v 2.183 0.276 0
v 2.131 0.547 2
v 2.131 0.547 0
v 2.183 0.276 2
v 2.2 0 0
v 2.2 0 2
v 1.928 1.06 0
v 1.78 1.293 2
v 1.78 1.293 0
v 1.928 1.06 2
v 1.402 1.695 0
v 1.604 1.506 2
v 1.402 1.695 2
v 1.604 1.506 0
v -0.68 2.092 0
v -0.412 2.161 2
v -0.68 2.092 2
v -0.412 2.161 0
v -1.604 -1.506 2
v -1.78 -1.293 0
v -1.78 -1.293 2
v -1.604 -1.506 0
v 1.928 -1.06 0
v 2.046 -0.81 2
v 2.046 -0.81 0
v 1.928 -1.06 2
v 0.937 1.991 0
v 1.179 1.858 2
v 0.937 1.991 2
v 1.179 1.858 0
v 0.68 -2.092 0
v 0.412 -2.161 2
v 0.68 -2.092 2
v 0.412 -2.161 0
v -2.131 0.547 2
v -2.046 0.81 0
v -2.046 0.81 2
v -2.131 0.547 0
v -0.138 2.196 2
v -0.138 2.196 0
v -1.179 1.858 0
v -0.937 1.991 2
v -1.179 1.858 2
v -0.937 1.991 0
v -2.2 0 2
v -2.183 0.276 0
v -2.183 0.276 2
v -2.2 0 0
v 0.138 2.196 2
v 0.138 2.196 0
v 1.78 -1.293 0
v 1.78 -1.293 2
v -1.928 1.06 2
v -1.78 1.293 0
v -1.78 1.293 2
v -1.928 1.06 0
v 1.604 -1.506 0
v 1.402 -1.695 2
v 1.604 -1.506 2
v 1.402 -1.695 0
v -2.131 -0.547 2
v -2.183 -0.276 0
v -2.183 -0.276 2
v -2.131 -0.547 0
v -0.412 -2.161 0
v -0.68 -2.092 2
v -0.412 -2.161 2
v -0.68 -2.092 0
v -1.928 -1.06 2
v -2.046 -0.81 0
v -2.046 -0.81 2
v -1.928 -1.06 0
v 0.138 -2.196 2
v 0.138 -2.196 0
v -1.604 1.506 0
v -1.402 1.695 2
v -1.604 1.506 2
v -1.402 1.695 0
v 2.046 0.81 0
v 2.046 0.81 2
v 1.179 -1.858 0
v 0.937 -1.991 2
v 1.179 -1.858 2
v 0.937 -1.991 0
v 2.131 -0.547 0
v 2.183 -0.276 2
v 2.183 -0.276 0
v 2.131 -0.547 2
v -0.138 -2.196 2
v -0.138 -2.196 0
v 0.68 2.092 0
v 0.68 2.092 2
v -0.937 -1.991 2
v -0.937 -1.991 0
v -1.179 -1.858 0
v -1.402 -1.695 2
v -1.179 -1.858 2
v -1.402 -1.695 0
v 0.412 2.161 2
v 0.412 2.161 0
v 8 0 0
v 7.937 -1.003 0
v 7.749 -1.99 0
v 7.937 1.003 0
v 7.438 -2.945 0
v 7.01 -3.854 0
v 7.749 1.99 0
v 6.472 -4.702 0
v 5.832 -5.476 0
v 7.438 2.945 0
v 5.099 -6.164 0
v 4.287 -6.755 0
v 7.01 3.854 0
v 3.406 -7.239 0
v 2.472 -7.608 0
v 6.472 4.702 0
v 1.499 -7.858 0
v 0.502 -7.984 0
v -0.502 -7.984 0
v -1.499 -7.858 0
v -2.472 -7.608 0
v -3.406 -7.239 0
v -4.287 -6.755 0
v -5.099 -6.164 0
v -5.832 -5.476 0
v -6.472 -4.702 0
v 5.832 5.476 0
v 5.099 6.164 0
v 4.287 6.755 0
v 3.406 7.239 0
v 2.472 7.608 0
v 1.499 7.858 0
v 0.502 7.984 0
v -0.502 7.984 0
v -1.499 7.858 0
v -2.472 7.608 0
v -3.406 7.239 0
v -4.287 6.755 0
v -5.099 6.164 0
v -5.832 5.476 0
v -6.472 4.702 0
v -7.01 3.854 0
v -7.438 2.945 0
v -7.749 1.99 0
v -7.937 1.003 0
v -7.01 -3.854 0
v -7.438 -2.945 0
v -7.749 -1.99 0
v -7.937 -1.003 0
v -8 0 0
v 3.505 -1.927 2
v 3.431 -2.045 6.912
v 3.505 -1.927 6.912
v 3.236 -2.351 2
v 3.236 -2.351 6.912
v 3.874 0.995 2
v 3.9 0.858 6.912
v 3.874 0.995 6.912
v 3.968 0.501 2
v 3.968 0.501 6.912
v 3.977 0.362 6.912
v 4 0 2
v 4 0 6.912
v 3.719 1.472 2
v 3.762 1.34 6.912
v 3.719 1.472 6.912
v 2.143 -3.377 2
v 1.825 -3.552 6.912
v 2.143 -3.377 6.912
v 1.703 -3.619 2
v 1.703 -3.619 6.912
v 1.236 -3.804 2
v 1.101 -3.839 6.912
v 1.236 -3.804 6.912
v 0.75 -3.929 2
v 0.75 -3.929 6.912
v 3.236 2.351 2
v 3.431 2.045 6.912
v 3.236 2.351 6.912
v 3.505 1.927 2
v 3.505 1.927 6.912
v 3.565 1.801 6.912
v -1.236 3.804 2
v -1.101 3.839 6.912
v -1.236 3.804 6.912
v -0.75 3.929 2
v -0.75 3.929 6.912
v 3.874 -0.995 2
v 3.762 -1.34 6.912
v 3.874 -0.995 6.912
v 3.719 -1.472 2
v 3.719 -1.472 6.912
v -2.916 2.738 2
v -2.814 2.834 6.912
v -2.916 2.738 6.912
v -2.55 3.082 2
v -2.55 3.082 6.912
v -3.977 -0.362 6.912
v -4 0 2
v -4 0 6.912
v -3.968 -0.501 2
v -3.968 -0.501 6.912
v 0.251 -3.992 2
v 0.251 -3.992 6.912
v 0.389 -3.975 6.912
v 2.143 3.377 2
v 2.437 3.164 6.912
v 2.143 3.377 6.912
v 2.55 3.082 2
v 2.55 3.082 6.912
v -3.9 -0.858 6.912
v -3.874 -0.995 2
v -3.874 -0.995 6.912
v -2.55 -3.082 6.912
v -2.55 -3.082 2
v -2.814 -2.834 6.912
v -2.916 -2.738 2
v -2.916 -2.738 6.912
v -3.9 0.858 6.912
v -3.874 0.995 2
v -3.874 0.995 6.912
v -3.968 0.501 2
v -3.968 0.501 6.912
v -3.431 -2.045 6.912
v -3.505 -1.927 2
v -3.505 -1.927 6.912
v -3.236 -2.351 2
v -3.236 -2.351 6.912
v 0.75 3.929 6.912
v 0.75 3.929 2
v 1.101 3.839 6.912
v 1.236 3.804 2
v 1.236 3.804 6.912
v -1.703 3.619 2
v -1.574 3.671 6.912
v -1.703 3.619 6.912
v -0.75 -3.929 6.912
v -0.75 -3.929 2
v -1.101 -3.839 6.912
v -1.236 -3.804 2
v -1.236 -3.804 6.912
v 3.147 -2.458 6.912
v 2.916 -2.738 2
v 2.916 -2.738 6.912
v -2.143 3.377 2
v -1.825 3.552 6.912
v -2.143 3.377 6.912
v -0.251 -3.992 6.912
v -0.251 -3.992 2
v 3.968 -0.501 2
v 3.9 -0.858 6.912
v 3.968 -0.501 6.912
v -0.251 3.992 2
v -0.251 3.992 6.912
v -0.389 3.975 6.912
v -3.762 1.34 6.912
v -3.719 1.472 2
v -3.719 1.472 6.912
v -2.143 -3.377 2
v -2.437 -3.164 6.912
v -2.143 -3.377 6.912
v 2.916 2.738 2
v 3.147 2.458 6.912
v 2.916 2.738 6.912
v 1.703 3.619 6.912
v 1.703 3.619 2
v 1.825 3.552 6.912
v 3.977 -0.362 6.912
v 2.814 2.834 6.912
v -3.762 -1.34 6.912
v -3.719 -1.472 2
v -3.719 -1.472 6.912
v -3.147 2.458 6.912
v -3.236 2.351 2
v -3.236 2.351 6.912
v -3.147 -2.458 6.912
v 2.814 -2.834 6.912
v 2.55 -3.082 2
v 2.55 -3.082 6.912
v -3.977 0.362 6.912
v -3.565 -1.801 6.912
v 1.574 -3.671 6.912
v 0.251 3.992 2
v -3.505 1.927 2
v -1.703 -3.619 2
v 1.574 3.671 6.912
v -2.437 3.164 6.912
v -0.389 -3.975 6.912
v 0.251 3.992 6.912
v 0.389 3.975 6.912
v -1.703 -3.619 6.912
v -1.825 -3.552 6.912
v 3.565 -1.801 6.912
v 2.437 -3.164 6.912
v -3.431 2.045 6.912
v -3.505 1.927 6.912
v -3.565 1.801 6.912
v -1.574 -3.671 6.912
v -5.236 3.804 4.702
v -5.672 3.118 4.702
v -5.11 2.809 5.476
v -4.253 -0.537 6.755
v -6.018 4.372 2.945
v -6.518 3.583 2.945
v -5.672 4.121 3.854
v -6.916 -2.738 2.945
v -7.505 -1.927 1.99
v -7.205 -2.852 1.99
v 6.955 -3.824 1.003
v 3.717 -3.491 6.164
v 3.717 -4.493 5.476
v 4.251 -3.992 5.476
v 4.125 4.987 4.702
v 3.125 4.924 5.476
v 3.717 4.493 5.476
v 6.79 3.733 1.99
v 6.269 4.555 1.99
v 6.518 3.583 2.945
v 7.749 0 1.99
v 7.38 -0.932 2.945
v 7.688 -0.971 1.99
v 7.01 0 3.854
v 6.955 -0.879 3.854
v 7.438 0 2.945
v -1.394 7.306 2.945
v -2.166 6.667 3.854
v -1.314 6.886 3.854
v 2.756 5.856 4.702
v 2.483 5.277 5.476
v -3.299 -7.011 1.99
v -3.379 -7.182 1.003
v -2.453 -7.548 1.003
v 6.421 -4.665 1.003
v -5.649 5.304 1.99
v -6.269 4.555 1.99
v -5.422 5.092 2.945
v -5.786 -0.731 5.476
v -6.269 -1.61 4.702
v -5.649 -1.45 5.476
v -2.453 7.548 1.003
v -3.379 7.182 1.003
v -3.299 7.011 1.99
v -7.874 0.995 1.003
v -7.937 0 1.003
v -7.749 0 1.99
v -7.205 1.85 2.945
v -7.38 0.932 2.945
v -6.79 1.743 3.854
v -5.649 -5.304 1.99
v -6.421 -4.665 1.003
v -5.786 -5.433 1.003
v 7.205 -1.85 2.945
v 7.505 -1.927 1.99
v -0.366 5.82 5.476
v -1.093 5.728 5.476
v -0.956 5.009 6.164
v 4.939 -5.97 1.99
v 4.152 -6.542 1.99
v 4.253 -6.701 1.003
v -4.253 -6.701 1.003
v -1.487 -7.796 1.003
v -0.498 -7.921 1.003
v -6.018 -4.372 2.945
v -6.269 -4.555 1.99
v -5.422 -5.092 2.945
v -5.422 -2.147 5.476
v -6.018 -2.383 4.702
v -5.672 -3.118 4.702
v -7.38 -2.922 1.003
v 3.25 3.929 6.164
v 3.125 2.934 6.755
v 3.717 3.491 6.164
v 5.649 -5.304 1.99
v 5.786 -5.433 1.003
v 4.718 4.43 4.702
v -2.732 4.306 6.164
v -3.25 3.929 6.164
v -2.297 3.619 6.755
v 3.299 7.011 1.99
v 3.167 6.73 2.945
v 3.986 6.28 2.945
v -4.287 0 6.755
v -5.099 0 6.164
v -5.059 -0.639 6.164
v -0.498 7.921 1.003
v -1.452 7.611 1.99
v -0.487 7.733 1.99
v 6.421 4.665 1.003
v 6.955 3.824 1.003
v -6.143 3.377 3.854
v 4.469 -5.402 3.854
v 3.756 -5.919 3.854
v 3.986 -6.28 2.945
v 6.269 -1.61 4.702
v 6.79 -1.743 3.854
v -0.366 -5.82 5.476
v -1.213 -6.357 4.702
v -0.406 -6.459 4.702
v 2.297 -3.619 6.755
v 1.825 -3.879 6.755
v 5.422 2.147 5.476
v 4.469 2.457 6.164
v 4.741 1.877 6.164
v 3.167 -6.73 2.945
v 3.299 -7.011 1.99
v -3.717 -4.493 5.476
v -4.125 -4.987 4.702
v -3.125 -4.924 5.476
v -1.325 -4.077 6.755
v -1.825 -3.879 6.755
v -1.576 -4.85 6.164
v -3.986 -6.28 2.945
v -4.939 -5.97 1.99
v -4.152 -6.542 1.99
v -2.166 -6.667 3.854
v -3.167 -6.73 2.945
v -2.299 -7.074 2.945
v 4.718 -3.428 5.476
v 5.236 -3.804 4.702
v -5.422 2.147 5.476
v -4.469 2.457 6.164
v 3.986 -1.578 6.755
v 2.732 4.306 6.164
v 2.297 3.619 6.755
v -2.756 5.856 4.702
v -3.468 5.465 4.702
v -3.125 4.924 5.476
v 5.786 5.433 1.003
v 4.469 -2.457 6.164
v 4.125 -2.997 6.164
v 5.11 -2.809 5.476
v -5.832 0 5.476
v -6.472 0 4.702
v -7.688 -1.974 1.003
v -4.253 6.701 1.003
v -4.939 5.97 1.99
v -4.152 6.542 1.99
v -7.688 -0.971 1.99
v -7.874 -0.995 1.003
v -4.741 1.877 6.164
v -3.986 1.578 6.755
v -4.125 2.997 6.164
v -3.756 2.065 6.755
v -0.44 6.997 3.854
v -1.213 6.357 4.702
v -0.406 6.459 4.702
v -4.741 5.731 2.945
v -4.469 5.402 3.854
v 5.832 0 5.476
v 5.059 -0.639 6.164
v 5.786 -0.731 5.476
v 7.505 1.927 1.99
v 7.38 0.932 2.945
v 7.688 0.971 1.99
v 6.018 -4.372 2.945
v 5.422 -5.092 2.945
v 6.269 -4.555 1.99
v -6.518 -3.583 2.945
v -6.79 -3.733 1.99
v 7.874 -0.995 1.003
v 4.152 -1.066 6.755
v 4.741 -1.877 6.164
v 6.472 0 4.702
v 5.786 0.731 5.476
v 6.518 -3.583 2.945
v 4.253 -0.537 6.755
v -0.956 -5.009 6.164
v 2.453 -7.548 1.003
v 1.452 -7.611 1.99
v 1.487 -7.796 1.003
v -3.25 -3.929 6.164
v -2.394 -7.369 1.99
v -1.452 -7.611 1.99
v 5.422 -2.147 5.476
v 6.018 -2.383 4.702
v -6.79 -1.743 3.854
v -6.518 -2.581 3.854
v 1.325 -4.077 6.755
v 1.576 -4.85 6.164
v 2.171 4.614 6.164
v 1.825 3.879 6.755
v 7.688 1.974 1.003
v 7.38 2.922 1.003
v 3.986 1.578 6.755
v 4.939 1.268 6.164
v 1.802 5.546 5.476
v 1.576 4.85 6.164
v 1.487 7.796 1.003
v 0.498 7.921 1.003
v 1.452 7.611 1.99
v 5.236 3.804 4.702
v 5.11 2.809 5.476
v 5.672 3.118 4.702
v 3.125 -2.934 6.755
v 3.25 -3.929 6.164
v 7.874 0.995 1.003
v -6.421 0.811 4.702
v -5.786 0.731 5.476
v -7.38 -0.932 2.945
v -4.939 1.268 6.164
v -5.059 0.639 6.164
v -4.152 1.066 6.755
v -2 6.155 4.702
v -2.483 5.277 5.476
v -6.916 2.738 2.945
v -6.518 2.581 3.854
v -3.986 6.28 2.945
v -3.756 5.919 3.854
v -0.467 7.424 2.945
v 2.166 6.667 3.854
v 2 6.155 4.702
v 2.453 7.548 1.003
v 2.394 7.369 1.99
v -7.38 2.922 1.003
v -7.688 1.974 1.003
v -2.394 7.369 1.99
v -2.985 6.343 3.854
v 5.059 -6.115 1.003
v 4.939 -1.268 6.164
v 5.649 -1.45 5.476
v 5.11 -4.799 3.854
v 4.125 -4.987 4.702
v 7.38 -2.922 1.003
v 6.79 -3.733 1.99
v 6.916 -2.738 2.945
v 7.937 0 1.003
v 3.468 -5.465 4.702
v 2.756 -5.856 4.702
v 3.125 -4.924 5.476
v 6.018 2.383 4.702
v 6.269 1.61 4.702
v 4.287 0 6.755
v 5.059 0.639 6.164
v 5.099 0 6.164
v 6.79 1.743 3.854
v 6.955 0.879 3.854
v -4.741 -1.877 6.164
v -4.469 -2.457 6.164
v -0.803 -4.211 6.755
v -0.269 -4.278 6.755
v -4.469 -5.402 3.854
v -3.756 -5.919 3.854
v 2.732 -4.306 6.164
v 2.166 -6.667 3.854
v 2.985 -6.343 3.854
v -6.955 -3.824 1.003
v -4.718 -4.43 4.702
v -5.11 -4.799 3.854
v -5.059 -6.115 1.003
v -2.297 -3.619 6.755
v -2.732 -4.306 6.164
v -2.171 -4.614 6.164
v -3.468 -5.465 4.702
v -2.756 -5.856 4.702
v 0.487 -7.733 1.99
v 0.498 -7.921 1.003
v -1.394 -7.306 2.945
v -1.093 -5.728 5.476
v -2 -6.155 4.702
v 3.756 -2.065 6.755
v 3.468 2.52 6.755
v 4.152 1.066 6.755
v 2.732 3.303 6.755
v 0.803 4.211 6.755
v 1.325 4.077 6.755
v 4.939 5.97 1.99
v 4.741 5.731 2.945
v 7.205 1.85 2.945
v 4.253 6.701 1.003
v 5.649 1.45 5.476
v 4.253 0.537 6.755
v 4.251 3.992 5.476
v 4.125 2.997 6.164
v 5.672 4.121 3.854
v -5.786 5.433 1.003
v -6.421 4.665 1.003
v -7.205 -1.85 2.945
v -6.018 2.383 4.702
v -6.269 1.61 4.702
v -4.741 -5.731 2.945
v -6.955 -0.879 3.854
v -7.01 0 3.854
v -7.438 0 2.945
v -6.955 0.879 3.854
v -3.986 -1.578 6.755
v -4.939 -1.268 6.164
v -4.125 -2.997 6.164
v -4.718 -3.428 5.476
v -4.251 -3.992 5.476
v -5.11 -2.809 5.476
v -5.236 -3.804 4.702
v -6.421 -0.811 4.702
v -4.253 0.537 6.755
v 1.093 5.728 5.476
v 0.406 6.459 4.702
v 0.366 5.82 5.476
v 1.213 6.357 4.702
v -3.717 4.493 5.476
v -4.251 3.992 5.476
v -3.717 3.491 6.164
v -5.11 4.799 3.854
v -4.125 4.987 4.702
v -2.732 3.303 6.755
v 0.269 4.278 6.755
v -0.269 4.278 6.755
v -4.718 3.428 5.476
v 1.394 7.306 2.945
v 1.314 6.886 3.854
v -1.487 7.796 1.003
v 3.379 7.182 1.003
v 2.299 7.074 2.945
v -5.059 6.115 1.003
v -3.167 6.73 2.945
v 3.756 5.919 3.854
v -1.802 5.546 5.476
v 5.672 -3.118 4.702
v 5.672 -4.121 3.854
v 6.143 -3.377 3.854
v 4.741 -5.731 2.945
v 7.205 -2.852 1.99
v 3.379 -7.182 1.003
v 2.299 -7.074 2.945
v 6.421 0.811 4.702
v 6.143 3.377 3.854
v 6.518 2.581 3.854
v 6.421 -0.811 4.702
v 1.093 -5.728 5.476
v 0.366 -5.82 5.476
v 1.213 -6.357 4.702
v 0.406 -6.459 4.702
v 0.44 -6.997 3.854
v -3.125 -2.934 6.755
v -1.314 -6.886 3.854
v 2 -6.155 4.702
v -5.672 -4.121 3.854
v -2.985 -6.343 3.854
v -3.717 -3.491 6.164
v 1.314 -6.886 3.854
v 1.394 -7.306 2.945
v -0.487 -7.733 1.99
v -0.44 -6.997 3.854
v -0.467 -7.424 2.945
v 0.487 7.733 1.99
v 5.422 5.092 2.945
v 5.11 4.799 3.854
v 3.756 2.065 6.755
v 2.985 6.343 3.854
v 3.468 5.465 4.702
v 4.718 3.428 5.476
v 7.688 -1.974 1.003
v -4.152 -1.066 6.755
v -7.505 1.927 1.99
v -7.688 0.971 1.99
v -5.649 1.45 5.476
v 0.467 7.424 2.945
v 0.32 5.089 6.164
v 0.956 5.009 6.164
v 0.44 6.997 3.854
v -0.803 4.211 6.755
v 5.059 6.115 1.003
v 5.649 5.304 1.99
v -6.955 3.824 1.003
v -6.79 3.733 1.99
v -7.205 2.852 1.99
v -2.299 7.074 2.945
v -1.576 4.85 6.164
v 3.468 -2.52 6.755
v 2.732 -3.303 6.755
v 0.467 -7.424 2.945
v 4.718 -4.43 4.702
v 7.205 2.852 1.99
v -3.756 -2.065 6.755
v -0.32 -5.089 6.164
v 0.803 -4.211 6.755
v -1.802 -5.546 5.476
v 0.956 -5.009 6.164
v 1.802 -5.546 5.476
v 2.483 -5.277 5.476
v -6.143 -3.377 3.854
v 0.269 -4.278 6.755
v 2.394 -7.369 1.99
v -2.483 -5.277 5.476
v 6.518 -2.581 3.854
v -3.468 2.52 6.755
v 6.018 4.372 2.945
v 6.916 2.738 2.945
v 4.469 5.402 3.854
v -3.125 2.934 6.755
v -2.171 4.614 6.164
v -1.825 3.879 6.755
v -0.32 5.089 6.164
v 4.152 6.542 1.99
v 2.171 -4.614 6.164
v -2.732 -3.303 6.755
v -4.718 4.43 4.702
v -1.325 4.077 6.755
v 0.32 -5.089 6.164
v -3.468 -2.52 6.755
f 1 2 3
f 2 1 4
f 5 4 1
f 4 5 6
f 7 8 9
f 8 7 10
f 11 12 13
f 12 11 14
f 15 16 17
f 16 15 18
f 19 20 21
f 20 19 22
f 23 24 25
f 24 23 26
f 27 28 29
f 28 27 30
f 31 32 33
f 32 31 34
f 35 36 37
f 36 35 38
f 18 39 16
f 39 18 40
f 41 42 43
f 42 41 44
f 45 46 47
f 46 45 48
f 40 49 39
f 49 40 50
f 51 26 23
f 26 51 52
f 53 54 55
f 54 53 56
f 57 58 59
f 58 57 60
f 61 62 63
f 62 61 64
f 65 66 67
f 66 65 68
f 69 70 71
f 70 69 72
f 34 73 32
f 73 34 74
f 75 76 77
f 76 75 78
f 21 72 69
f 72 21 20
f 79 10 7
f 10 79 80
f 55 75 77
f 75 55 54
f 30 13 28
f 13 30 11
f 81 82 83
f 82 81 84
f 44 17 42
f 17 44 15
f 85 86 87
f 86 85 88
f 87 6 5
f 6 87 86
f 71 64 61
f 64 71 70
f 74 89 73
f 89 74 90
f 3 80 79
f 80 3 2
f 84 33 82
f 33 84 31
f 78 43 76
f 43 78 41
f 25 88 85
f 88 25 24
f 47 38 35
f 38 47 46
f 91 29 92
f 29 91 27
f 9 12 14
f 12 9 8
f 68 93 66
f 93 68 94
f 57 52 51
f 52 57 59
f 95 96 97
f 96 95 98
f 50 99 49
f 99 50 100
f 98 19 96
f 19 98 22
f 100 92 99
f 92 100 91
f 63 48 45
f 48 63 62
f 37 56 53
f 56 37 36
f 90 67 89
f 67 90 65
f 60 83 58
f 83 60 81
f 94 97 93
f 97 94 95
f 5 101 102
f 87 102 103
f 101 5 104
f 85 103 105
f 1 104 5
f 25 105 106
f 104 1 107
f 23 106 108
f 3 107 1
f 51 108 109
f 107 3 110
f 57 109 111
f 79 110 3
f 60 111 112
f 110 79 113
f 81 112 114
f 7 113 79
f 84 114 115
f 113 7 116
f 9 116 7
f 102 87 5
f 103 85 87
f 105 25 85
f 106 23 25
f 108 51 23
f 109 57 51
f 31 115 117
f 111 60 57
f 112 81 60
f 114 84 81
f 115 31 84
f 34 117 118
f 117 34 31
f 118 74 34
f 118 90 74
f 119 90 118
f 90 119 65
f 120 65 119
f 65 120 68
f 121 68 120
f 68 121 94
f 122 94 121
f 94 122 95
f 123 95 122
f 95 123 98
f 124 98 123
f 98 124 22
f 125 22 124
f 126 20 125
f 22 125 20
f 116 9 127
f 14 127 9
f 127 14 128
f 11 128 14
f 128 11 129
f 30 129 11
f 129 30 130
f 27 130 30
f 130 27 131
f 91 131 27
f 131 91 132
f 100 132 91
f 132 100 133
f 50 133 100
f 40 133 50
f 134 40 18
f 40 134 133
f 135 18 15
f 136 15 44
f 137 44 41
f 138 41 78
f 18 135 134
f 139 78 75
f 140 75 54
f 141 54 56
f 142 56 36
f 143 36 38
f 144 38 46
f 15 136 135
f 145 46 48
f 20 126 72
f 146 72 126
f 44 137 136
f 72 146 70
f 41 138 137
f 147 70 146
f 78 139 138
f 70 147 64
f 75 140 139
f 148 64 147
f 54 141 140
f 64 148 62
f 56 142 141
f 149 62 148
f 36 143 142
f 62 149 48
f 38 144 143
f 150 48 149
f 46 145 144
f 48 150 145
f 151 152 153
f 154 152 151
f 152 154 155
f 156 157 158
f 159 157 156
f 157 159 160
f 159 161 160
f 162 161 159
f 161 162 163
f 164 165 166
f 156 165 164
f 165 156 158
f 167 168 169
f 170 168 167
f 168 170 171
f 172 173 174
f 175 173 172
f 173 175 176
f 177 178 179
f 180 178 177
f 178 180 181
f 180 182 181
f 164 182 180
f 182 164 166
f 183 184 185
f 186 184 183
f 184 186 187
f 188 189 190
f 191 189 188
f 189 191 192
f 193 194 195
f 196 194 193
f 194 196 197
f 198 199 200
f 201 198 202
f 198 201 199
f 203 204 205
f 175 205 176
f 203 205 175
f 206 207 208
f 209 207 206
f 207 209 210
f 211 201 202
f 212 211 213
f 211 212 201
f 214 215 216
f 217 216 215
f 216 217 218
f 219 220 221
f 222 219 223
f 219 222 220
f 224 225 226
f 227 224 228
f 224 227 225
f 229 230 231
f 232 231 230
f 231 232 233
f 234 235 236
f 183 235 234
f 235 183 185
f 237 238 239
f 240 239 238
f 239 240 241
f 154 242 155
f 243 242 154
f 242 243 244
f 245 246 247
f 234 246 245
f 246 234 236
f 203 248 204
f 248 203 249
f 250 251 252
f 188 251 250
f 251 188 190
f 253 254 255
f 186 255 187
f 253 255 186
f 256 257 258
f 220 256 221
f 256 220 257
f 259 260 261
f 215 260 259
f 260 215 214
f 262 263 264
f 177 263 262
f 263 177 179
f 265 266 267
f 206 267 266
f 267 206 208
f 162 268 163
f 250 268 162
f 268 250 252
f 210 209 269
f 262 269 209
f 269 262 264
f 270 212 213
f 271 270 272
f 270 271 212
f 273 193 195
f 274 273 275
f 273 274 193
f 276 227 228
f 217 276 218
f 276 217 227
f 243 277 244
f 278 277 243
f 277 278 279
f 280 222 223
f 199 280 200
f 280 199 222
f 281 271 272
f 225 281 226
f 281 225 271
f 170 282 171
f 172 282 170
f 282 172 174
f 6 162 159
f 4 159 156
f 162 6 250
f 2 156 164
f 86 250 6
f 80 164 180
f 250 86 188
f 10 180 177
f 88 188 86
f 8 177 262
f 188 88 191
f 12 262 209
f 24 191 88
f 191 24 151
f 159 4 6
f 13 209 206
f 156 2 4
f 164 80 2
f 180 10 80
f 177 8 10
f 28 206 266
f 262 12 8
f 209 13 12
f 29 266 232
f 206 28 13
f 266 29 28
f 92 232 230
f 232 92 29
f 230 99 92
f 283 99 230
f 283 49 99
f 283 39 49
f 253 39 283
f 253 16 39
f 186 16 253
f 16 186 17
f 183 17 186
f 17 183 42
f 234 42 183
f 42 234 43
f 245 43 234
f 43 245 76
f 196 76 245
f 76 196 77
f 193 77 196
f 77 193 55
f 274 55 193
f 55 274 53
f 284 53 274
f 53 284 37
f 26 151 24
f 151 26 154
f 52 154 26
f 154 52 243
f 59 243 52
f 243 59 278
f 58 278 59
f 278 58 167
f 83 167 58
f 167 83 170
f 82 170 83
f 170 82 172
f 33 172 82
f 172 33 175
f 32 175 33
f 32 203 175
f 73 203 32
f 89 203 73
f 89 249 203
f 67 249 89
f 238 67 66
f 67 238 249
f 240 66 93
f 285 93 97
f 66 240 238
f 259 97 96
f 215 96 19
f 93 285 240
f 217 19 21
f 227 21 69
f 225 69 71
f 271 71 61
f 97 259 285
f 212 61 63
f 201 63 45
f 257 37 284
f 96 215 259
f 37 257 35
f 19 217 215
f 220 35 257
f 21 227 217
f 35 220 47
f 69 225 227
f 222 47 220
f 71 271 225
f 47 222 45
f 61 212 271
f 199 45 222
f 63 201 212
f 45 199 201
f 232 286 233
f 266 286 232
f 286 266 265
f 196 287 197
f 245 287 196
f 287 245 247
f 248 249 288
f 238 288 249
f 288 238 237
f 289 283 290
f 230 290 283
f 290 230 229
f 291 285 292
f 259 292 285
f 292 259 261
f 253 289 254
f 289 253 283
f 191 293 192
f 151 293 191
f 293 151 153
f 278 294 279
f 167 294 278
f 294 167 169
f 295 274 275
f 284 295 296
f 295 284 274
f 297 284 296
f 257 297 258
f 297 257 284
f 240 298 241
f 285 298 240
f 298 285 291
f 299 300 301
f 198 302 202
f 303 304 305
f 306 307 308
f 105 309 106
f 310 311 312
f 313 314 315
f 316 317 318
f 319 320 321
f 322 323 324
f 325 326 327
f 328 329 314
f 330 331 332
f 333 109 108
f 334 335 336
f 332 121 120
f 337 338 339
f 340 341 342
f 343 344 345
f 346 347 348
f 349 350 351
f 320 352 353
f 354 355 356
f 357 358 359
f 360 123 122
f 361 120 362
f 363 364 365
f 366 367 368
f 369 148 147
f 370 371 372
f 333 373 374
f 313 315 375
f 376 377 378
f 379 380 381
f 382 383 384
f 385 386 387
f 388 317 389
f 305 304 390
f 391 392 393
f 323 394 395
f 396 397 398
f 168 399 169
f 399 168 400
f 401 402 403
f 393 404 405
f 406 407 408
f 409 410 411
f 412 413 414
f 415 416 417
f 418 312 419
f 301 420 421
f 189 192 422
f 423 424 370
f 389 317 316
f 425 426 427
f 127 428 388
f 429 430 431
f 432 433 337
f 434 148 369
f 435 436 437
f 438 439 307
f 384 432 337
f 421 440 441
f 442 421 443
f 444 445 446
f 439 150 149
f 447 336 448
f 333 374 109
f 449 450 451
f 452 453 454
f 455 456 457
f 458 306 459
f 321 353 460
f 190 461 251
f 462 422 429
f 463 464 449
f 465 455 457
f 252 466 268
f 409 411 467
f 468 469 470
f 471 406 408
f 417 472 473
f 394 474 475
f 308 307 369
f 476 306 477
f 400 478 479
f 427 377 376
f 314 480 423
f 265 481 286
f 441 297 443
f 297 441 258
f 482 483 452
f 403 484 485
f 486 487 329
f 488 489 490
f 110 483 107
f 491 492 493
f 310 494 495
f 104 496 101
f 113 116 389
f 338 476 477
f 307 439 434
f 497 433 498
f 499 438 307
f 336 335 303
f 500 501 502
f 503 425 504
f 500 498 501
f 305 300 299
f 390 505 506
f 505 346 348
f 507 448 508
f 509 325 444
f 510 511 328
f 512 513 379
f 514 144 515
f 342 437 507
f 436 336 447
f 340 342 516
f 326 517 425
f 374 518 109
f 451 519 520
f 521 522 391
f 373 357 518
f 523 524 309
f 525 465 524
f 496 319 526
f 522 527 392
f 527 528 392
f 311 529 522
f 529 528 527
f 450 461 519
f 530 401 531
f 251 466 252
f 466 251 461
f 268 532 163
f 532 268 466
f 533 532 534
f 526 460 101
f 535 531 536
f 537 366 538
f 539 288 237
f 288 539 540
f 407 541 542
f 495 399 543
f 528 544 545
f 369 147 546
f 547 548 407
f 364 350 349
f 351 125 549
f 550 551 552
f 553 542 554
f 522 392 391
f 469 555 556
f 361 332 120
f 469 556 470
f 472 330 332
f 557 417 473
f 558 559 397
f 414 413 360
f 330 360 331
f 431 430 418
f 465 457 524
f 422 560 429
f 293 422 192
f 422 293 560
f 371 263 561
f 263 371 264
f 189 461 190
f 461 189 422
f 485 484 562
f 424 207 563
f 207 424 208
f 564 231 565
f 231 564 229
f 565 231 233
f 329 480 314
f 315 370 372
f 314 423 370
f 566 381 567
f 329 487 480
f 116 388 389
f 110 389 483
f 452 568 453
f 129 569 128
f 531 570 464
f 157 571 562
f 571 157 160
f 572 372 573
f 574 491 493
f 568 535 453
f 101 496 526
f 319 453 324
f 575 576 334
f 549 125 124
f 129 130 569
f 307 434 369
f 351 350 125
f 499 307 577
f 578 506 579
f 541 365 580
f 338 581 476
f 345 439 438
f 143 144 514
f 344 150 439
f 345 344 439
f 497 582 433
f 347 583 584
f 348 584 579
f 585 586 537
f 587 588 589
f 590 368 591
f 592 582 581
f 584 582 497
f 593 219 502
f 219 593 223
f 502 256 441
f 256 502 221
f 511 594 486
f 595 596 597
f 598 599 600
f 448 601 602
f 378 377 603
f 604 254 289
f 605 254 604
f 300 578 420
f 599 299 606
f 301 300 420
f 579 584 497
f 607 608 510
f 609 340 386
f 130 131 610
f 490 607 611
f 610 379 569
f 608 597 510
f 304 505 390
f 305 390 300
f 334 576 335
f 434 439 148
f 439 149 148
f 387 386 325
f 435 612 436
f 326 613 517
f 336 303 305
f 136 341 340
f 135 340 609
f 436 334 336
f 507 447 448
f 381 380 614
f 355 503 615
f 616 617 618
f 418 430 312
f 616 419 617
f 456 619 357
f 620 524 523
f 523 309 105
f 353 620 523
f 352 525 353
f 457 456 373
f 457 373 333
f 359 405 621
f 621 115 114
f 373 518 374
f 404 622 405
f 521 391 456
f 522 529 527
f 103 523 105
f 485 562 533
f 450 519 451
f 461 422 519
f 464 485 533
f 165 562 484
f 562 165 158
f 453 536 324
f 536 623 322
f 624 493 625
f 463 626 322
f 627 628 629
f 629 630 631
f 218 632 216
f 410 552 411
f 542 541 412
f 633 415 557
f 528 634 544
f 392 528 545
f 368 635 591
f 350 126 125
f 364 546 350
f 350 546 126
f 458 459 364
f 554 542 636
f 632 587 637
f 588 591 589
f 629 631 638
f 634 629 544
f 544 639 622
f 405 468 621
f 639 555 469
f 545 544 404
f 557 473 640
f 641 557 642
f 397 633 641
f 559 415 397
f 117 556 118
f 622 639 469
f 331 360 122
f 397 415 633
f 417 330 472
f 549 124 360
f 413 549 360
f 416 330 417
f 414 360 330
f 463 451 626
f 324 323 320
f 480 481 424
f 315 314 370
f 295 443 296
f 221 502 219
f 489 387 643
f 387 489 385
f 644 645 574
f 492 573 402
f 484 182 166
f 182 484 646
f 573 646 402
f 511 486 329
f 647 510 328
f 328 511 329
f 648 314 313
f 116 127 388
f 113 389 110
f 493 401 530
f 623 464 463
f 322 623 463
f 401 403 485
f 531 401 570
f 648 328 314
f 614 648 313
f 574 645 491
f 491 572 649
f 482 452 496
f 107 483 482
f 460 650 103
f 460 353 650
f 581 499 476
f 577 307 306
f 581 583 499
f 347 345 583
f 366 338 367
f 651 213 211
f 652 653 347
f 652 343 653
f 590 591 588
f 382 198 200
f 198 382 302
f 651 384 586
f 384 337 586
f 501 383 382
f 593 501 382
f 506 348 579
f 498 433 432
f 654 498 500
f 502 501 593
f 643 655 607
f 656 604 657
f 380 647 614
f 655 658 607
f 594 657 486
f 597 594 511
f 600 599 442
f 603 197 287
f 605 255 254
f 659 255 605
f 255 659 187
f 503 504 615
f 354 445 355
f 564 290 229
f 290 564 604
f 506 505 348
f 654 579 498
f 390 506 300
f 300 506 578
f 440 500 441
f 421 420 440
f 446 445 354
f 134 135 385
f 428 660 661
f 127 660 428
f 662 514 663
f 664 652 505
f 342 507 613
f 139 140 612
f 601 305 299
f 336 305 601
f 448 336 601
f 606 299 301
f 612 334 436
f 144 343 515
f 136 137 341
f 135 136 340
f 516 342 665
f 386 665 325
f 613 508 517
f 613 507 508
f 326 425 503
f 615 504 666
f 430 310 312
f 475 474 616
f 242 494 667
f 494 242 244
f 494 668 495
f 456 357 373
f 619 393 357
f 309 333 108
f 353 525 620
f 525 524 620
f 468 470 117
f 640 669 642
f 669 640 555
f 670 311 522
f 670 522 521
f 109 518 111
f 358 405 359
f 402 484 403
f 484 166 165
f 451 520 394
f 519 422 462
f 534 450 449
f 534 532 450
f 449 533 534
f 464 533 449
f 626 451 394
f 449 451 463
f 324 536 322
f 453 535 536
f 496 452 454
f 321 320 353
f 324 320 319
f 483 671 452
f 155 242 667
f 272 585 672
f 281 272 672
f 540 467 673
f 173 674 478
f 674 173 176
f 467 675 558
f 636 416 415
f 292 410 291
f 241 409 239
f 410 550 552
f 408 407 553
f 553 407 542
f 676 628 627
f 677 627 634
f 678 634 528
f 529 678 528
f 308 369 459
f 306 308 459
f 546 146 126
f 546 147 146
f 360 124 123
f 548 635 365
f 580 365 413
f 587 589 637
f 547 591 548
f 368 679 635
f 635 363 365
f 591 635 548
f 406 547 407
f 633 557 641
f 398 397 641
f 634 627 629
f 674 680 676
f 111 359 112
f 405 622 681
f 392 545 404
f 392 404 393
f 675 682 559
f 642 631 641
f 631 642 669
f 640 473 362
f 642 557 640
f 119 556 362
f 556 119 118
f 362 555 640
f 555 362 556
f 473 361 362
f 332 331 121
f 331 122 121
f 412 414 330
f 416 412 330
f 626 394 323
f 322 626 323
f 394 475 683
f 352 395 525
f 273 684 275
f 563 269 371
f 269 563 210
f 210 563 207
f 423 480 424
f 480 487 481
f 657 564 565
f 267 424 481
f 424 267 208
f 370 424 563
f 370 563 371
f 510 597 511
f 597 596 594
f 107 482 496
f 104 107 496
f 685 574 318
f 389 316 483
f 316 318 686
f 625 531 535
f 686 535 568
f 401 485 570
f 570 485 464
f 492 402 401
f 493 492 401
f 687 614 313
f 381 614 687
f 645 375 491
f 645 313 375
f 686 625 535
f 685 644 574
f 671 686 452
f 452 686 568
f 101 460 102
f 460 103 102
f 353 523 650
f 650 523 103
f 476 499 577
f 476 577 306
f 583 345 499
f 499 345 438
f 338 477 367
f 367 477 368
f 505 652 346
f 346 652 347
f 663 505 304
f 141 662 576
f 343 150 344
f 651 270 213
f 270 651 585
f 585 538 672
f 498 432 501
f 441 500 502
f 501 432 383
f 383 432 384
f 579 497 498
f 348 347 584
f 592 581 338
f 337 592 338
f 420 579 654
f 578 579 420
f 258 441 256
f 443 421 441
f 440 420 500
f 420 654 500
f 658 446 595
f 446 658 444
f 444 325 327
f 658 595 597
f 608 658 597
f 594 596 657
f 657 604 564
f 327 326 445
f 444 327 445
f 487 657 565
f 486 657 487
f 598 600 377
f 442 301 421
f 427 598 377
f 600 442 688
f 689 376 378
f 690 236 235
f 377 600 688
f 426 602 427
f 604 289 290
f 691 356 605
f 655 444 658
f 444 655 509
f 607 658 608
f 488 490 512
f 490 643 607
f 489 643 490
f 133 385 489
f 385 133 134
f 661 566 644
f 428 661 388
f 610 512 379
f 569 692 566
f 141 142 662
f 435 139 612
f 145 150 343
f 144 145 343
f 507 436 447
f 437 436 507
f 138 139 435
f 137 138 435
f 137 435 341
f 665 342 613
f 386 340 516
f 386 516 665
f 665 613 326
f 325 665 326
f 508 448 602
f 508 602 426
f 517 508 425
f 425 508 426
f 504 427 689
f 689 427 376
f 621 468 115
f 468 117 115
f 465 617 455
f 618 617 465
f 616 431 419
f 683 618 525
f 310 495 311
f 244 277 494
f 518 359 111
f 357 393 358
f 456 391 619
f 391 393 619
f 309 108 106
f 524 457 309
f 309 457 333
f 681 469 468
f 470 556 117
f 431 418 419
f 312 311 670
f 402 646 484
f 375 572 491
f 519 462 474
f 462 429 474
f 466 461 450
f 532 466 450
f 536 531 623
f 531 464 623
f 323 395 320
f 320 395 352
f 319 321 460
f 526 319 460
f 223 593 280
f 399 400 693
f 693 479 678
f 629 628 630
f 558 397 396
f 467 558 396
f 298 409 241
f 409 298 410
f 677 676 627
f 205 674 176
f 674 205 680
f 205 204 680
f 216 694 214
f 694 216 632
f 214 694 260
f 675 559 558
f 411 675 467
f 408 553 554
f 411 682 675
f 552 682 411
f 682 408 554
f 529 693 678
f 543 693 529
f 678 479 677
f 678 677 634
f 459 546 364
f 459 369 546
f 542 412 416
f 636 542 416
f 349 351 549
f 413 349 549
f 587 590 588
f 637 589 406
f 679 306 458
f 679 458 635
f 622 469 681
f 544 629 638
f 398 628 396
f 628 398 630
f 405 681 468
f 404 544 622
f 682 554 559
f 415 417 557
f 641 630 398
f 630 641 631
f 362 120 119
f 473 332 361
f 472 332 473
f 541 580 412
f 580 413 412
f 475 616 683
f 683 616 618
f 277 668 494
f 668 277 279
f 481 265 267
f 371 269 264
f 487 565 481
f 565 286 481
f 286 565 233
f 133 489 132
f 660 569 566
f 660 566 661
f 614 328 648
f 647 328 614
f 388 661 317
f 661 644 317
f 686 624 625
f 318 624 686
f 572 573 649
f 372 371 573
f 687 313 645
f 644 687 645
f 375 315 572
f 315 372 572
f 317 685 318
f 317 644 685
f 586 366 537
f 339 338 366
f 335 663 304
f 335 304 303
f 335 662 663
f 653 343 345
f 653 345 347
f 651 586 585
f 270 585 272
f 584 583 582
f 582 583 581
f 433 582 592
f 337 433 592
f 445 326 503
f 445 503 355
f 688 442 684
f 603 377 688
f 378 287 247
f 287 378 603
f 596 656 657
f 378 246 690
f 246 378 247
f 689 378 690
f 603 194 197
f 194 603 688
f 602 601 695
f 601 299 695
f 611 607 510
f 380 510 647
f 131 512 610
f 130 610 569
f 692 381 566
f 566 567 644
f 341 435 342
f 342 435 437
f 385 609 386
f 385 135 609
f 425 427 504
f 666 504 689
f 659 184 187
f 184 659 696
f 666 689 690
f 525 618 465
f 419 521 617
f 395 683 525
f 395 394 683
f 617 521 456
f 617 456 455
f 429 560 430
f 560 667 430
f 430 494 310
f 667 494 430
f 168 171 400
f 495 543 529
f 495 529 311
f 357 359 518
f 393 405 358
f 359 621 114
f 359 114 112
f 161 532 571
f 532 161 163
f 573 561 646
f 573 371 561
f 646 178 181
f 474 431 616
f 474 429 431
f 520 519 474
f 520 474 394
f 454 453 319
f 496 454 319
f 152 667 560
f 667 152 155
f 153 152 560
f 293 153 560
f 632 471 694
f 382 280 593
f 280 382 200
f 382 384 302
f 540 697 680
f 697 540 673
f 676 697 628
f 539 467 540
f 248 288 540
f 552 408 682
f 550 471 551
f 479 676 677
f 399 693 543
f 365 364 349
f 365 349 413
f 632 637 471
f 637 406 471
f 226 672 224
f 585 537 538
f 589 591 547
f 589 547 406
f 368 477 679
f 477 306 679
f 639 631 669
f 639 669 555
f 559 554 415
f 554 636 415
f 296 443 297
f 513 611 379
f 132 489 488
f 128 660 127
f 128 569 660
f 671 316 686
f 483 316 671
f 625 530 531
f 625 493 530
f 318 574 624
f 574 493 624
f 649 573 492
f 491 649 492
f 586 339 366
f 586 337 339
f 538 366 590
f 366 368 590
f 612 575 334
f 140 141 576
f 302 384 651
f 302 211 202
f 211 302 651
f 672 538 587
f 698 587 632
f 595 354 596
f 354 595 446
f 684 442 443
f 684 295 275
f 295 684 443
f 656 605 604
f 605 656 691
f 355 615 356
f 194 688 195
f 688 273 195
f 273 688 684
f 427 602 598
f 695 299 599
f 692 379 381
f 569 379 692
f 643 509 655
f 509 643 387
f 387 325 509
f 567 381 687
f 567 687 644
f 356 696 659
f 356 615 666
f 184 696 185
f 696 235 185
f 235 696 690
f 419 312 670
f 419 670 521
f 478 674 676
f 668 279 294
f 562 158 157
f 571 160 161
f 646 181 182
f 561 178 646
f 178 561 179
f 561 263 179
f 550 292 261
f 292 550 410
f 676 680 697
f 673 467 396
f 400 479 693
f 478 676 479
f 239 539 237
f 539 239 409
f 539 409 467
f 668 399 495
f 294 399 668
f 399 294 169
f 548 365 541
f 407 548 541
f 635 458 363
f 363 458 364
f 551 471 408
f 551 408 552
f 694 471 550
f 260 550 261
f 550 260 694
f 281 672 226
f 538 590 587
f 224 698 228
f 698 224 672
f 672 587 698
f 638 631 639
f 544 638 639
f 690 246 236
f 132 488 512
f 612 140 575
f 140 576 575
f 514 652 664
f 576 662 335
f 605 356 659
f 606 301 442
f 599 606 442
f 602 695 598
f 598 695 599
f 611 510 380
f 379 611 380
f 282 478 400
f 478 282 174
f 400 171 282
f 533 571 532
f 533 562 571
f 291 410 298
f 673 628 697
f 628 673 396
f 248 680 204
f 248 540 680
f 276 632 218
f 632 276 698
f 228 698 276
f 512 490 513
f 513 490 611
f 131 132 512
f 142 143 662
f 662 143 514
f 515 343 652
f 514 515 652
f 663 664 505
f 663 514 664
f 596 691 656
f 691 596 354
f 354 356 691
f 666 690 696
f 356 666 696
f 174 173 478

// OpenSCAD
// sphere mount


sphere_dia = 16;


$fn = 50;

screw_dia = 4.4;

countersink_dia = 8;
countersink_depth = sphere_dia/2 - 2;

difference () {
    union () {
        sphere(r = sphere_dia/2);

    }
    // center hole
    union() {
        // screw hole
        translate([0,0, sphere_dia/4])
        cylinder(r = screw_dia/2, h = sphere_dia/2, center = true);

        // countersink
        translate([0,0, countersink_depth/2  + 2])
        cylinder(r = countersink_dia/2, h = countersink_depth, center = true);       
        
        // take out 1/2 of the sphere
        translate([0,0,-sphere_dia/4])
        cube([sphere_dia, sphere_dia, sphere_dia/2], center = true);
    }
}
